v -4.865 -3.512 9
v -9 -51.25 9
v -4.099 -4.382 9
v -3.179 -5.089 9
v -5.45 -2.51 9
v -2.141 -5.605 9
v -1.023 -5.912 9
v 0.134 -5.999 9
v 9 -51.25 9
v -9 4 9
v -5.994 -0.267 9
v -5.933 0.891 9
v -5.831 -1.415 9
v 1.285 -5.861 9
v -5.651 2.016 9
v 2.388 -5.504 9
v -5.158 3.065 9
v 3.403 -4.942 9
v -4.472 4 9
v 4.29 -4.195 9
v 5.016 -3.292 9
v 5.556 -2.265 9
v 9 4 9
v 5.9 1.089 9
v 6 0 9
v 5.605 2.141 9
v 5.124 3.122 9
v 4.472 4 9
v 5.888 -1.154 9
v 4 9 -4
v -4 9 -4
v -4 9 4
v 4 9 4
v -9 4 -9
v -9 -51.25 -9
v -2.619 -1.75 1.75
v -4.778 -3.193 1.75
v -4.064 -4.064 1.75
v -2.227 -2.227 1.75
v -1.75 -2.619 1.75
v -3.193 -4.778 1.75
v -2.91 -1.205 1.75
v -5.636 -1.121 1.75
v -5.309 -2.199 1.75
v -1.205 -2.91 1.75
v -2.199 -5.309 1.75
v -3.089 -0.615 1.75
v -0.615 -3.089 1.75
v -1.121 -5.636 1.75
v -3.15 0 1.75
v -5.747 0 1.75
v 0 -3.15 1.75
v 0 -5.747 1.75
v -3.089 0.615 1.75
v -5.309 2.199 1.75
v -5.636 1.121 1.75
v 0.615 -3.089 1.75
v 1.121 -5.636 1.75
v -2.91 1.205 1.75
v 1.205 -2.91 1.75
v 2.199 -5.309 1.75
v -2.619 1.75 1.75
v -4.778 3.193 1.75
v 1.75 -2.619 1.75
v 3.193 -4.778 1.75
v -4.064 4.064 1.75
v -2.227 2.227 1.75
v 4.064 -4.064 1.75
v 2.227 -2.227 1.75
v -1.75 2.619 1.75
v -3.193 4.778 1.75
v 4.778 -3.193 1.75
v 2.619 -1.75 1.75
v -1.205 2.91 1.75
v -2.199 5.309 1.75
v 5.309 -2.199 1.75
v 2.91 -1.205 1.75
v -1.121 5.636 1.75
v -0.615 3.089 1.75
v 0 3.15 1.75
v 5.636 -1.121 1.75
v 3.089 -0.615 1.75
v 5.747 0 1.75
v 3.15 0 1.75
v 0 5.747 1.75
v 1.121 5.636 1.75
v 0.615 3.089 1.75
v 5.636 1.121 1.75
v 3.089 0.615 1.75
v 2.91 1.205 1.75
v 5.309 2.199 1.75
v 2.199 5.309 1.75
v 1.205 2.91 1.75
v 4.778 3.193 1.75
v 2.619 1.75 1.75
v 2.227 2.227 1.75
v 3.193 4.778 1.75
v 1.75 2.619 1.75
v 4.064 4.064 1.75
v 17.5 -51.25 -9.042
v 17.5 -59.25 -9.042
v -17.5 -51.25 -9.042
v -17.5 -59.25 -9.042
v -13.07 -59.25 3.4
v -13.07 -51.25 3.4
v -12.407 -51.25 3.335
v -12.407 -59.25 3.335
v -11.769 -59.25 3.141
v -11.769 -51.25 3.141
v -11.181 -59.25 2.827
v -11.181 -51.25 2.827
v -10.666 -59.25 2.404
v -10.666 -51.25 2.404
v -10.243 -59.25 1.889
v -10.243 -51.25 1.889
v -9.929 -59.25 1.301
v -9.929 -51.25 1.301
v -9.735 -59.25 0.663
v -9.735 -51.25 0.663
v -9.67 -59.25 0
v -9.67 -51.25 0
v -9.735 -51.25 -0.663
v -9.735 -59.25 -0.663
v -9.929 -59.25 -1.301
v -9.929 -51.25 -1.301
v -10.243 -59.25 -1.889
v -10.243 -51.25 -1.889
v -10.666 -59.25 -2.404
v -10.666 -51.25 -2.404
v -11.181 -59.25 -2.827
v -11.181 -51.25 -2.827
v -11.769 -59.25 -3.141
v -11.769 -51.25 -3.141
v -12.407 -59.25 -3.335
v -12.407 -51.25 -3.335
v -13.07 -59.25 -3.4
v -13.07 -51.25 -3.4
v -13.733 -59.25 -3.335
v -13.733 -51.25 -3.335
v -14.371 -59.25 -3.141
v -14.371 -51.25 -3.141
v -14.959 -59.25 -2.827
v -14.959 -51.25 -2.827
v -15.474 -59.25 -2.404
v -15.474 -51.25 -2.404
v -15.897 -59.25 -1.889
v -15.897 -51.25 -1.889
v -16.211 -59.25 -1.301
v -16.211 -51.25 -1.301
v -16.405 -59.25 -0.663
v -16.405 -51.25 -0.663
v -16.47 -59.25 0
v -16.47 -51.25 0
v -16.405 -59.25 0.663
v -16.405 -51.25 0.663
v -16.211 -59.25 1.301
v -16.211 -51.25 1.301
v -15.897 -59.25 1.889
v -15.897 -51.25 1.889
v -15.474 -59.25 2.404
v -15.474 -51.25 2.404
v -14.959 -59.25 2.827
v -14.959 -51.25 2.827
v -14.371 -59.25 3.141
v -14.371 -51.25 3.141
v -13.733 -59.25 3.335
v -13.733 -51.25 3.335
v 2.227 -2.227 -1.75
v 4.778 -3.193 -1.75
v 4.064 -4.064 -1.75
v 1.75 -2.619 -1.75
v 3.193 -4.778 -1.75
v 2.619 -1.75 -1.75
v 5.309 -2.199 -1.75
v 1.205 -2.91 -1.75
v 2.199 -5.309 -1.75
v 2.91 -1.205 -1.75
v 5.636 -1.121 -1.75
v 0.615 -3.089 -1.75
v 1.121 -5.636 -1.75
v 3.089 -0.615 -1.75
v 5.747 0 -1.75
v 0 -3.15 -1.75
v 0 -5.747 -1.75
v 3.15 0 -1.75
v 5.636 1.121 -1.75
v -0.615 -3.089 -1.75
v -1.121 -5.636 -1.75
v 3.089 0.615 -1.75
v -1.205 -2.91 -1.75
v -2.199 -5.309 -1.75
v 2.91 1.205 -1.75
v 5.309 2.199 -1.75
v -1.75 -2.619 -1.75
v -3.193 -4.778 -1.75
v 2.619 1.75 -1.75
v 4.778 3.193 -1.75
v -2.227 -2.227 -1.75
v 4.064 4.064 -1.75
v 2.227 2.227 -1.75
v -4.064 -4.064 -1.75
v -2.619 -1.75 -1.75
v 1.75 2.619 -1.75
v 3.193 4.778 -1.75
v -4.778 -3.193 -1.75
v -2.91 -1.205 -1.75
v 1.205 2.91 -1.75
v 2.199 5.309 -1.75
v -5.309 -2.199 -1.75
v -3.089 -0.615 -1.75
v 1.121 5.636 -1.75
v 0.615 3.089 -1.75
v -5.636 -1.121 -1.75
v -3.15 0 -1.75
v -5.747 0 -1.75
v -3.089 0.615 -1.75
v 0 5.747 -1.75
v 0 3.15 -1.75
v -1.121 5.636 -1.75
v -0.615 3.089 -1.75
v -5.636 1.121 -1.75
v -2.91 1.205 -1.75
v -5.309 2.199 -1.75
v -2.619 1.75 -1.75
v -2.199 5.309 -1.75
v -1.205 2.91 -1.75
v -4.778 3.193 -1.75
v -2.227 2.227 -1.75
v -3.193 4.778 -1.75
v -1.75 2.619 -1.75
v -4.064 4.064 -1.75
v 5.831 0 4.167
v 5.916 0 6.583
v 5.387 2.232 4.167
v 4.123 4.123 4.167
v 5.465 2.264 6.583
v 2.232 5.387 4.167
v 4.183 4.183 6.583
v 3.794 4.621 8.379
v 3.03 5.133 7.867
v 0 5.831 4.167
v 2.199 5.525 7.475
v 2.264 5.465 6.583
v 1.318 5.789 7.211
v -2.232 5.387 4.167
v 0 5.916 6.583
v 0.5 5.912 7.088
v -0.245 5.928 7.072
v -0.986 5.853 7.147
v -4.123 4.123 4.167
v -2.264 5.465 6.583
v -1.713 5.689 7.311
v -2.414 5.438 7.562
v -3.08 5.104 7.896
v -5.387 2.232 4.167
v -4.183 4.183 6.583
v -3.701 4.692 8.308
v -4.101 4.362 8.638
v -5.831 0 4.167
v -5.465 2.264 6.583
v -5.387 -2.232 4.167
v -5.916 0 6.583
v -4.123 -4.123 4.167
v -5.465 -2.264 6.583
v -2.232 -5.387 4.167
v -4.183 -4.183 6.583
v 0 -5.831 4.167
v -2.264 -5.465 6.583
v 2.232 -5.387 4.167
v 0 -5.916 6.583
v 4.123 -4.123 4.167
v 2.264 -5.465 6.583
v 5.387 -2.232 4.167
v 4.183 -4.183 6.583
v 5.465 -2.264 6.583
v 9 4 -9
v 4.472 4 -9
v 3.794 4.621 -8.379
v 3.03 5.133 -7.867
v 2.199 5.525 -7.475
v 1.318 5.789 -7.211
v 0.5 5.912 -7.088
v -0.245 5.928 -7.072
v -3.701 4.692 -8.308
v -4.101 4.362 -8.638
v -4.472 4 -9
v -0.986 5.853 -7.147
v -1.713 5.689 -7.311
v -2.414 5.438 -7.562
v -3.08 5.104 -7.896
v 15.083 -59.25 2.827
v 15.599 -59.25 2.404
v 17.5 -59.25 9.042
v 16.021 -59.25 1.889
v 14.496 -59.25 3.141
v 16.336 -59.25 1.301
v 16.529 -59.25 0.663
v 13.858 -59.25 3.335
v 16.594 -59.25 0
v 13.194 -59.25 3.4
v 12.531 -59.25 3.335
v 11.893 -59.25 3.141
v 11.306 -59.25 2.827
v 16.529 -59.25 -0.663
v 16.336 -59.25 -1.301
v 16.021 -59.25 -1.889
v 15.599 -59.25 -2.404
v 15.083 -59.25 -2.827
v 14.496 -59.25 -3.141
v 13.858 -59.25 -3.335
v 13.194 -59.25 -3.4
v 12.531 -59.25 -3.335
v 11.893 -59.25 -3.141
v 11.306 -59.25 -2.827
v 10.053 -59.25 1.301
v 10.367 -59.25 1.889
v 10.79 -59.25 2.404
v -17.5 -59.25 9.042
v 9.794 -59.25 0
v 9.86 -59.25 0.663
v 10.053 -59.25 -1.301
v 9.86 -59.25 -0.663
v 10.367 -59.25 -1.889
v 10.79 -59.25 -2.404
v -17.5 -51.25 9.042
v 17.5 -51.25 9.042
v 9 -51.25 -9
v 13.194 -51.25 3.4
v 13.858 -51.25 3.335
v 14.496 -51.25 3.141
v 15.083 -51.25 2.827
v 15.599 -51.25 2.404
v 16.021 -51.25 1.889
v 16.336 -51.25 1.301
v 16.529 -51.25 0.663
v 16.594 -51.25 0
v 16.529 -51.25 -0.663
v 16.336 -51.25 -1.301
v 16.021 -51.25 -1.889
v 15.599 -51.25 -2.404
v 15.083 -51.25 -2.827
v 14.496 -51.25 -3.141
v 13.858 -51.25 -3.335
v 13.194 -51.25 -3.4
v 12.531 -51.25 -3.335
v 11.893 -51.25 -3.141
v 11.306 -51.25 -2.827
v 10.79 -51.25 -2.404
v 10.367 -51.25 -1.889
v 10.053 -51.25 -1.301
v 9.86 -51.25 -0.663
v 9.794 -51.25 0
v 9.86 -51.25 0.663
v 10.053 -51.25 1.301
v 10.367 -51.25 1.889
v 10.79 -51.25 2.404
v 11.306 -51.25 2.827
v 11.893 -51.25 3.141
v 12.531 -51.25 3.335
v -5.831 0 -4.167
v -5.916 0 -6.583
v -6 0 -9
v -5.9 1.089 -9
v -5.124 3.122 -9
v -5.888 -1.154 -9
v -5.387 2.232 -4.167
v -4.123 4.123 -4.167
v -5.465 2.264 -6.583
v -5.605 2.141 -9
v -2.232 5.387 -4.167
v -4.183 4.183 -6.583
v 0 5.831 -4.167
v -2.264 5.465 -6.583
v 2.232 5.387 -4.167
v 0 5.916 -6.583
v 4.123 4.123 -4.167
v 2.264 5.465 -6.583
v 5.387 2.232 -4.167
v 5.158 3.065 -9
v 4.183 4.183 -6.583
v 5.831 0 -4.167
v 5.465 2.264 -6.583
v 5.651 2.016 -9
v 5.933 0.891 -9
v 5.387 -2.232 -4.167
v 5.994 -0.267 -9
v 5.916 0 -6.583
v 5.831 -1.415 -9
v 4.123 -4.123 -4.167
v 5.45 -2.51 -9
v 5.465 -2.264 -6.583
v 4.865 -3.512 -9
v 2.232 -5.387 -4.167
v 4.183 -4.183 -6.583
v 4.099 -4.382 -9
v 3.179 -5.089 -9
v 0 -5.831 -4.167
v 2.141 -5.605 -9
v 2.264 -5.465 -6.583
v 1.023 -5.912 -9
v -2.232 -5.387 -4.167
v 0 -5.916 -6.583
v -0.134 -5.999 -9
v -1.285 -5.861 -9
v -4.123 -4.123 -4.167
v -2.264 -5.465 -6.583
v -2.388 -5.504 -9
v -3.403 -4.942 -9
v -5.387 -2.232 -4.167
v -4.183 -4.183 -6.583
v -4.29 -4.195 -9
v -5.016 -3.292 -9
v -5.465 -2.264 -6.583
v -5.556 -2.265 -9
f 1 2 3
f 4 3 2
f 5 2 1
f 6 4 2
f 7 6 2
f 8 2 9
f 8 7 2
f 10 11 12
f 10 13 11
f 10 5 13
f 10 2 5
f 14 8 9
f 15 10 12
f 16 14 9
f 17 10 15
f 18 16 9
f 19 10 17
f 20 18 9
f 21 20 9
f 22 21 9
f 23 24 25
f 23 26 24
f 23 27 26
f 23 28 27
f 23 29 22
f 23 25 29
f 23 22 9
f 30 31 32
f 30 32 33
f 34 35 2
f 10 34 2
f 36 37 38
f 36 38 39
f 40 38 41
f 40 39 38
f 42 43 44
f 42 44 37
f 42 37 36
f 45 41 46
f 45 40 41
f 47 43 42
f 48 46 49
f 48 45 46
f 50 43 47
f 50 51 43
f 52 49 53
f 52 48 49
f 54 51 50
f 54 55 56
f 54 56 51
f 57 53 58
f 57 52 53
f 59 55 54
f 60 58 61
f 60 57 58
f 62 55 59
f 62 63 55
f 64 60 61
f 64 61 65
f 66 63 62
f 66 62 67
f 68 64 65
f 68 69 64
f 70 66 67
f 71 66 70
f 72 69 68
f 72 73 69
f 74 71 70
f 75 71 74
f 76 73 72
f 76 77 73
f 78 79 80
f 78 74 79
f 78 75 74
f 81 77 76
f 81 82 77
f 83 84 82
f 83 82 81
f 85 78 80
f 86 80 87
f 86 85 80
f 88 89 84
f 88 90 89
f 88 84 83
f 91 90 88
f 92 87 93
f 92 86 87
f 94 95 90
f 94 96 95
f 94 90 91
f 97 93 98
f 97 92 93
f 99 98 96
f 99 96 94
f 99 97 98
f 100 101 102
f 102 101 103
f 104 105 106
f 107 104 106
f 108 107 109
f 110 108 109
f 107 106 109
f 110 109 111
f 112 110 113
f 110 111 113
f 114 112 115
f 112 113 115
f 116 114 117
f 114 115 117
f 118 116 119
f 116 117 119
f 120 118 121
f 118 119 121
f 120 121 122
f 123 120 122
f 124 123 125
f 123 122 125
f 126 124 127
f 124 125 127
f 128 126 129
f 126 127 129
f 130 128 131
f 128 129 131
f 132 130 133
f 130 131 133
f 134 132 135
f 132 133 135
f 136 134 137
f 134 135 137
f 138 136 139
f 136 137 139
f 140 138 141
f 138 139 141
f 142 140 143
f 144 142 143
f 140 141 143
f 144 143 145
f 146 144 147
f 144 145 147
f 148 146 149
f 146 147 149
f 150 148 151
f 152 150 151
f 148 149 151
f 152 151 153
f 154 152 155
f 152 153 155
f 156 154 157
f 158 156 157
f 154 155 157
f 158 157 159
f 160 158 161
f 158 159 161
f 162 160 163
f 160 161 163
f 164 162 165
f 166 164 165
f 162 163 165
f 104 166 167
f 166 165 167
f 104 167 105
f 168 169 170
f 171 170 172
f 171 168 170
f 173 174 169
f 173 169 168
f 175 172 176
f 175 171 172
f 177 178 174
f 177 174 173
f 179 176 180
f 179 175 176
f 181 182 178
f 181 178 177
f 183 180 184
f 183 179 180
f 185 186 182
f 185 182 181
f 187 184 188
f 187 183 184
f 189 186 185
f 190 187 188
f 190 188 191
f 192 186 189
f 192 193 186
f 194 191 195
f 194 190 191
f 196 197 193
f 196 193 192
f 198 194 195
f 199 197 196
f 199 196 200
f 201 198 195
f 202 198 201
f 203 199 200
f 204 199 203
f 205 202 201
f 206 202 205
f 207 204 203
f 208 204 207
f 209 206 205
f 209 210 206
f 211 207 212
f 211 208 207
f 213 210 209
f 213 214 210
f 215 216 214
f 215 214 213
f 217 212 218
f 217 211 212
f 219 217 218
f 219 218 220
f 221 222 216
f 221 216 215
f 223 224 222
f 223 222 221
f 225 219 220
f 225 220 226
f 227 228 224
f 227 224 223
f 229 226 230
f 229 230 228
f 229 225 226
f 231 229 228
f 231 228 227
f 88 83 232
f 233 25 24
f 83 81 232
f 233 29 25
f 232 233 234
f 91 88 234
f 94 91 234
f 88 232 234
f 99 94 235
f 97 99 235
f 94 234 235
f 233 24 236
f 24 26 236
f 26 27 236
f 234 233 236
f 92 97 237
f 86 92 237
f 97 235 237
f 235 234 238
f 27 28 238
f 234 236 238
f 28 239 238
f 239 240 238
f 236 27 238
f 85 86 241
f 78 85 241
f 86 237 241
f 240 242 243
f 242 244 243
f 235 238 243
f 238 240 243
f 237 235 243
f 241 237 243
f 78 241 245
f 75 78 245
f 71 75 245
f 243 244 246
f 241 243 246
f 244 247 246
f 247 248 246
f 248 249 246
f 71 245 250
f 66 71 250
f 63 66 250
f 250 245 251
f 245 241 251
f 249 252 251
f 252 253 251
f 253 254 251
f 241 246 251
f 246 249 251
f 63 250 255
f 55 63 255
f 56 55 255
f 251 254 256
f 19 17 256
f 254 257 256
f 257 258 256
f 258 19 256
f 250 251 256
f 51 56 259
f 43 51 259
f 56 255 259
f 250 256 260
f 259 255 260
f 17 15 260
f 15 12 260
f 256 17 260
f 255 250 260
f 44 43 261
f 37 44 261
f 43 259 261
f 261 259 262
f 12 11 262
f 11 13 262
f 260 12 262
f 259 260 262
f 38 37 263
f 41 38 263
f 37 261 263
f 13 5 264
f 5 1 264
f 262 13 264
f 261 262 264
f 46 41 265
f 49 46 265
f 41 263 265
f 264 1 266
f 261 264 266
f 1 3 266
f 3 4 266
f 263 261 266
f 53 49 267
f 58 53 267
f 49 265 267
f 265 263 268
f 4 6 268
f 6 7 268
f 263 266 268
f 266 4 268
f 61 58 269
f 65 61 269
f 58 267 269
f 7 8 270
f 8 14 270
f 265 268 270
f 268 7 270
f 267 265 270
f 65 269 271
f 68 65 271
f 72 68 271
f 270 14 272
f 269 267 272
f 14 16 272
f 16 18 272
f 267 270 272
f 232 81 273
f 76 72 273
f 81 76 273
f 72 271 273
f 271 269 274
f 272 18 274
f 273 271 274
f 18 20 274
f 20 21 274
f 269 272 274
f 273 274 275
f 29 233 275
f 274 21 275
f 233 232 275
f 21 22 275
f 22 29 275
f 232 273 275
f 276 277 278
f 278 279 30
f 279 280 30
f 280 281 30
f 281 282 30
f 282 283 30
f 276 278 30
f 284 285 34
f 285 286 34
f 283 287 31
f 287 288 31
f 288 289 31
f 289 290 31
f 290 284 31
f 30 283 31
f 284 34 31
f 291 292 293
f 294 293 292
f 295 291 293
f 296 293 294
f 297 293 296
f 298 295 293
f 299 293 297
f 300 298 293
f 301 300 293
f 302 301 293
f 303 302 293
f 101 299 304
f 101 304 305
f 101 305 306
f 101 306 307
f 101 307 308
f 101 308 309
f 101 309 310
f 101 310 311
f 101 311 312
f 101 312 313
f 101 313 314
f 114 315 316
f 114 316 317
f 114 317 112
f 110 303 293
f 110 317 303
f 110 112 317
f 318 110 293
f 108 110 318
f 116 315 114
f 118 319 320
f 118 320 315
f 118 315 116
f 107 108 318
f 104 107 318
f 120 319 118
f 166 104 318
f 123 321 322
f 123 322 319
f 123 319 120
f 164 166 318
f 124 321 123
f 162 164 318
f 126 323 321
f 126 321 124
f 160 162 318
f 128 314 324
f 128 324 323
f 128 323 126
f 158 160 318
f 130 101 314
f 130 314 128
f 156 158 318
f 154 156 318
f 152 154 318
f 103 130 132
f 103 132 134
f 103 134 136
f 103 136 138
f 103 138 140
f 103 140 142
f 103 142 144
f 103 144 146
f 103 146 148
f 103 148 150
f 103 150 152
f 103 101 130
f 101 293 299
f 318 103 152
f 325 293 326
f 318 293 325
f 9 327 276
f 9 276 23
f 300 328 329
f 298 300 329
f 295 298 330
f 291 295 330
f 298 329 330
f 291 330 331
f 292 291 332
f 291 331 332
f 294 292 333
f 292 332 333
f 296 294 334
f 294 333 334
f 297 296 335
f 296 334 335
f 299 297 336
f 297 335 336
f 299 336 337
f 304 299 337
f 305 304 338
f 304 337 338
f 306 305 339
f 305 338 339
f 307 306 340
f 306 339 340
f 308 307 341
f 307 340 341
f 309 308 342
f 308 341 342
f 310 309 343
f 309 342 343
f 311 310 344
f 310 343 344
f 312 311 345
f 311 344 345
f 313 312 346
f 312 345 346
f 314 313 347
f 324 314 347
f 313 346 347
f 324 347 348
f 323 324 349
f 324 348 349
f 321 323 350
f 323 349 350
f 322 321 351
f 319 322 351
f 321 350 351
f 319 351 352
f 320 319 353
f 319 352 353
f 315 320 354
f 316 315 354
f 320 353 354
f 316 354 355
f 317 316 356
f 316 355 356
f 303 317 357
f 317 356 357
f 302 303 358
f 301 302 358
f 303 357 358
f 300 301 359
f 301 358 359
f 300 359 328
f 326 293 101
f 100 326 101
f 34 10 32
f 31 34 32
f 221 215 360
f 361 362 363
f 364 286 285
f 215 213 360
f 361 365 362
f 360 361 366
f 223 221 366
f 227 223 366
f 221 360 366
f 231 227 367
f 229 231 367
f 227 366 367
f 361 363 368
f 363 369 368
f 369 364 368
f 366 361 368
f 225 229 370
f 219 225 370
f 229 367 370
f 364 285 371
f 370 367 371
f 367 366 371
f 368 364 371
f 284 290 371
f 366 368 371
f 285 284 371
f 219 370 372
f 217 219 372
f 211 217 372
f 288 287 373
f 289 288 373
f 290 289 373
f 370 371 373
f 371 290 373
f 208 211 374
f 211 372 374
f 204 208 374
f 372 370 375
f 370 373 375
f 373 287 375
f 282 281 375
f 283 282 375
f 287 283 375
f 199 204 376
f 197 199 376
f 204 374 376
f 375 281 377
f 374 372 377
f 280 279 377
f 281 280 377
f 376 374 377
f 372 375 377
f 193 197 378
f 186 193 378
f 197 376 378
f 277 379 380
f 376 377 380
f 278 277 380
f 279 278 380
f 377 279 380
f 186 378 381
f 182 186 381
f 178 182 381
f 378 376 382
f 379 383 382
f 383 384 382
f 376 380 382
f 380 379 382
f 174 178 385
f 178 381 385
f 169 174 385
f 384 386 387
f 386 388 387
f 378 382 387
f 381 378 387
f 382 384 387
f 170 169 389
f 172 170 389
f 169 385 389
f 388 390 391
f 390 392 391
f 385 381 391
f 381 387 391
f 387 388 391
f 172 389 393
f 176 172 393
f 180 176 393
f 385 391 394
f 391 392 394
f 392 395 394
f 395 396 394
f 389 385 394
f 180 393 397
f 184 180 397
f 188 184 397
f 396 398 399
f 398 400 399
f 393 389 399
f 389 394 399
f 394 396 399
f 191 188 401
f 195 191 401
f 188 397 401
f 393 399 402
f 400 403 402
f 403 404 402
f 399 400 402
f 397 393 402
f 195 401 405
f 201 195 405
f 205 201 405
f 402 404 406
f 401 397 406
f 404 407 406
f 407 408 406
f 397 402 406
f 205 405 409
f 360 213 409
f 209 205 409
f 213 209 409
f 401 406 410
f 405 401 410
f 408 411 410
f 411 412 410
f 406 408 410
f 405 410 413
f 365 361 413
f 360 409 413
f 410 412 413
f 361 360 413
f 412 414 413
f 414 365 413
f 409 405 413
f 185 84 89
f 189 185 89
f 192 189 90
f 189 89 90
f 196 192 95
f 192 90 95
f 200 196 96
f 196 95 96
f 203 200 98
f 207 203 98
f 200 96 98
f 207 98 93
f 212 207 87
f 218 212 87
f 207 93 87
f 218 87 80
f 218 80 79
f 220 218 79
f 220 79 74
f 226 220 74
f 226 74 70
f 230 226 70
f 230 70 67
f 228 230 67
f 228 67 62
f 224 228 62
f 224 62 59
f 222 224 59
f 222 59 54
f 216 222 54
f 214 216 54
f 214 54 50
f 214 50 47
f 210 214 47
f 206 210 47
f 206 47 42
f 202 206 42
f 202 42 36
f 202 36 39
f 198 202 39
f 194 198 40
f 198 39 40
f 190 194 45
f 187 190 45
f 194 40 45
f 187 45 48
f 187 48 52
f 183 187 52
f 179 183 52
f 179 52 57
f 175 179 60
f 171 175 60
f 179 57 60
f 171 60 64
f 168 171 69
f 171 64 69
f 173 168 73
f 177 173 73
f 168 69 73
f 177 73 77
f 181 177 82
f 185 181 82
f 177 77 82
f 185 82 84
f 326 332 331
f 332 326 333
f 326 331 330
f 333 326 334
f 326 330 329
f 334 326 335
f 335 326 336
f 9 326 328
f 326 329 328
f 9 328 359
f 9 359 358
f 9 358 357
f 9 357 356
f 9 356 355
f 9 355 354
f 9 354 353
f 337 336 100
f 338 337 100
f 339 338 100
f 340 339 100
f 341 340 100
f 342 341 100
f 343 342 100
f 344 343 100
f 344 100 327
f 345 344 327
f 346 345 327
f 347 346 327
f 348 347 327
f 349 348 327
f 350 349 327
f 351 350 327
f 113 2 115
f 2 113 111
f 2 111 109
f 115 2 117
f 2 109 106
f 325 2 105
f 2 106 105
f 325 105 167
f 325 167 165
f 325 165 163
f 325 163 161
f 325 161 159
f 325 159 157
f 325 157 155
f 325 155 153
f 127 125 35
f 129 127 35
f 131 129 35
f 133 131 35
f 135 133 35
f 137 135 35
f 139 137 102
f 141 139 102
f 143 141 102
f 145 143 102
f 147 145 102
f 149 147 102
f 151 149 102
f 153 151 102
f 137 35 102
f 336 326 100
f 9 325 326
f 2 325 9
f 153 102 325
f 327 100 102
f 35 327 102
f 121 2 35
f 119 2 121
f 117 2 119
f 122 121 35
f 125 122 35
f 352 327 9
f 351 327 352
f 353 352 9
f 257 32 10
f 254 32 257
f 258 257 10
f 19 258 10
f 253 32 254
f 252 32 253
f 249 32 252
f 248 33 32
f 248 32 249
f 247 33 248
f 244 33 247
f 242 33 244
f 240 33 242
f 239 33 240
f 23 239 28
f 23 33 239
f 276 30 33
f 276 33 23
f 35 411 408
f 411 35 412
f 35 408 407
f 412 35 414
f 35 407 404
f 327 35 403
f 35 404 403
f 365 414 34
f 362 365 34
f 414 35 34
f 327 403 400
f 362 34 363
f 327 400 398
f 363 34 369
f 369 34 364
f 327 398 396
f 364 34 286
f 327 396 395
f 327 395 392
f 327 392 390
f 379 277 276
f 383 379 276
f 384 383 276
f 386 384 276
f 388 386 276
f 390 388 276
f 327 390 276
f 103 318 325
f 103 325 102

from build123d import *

# Parameters (mm, degrees)
SKETCH4_W           = 18
SKETCH4_H           = 18
BOSS_EXTRUDE2_DEPTH = 9
SKETCH5_R           = 3.15
CUT_EXTRUDE1_DEPTH  = 18
SKETCH6_R           = 6
CUT_EXTRUDE2_DEPTH  = 7.25
CUT_EXTRUDE2_DRAFT  = -2
SKETCH8_R           = 6
CUT_EXTRUDE3_DEPTH  = 7.25
CUT_EXTRUDE3_DRAFT  = -2
CHAMFER1_SIZE       = 5
SKETCH13_W          = 18
SKETCH13_H          = 18
BOSS_EXTRUDE4_DEPTH = 50.25
SKETCH14_W          = 35
SKETCH14_H          = 18.08381725
BOSS_EXTRUDE5_DEPTH = 8
SKETCH15_R          = 3.4
CUT_EXTRUDE4_DEPTH  = 8
SKETCH16_R          = 3.4
CUT_EXTRUDE5_DEPTH  = 8


with BuildPart() as part:
    # Sketch4 → Boss-Extrude2 (new, symmetric)
    with BuildSketch(Plane(origin=(0, 0, 0), x_dir=(1, 0, 0), z_dir=(0, 1, 0))):
        Rectangle(SKETCH4_W, SKETCH4_H)
    extrude(amount=BOSS_EXTRUDE2_DEPTH, both=True)

    # Sketch5 → Cut-Extrude1 (cut)
    with BuildSketch(Plane.XY.offset(9)):
        Circle(SKETCH5_R)
    extrude(amount=-CUT_EXTRUDE1_DEPTH, mode=Mode.SUBTRACT)


with BuildPart() as cut_extrude2_tool:
    # Sketch6 → Cut-Extrude2 (with draft: the straight prism first)
    with BuildSketch(Plane.XY.offset(9)):
        Circle(SKETCH6_R)
    extrude(amount=-CUT_EXTRUDE2_DEPTH)
    # Cut-Extrude2: the draft: its side faces are tilted about the plane it starts from
    cut_extrude2_sides = [cut_extrude2_tool.faces().sort_by_distance(p)[0] for p in [
        (-6, 0, 5.375),
    ]]
    draft(cut_extrude2_sides, Plane.XY.offset(9), CUT_EXTRUDE2_DRAFT)


with BuildPart() as part_1:
    add(part.part)

    # Cut-Extrude2: cut by cut_extrude2_tool
    add(cut_extrude2_tool.part, mode=Mode.SUBTRACT)


with BuildPart() as cut_extrude3_tool:
    # Sketch8 → Cut-Extrude3 (with draft: the straight prism first)
    with BuildSketch(Plane(origin=(0, 0, -9), x_dir=(-1, 0, 0), z_dir=(0, 0, -1))):
        Circle(SKETCH8_R)
    extrude(amount=-CUT_EXTRUDE3_DEPTH)
    # Cut-Extrude3: the draft: its side faces are tilted about the plane it starts from
    cut_extrude3_sides = [cut_extrude3_tool.faces().sort_by_distance(p)[0] for p in [
        (6, 0, -5.375),
    ]]
    draft(cut_extrude3_sides, Plane(origin=(0, 0, -9), x_dir=(-1, 0, 0), z_dir=(0, 0, -1)), CUT_EXTRUDE3_DRAFT)


with BuildPart() as part_2:
    add(part_1.part)

    # Cut-Extrude3: cut by cut_extrude3_tool
    add(cut_extrude3_tool.part, mode=Mode.SUBTRACT)

    # Chamfer1
    # the kernel refuses this chamfer: 5 mm, written as the material it takes off along each edge
    with BuildSketch(Plane(origin=(-9, 9, 21.85841494), x_dir=(-0.027495876610586317, -0.9996219169112968, 0), z_dir=(0, 0, -1)), Plane(origin=(-21.85841494, 9, -9), x_dir=(0, -0.9996219169112968, -0.027495876610586317), z_dir=(1, 0, 0))) as chamfer1_piece_1:
        Polygon((CHAMFER1_SIZE * 0.999621916911, -CHAMFER1_SIZE * 0.0274958766106), (-CHAMFER1_SIZE * 0.0274958766106, -CHAMFER1_SIZE * 0.999621916911), (0, 0), align=None)
    extrude(amount=43.71682988, mode=Mode.SUBTRACT)
    with BuildSketch(Plane(origin=(21.85841494, 9, 9), x_dir=(0, 0.027495876610586317, -0.9996219169112968), z_dir=(-1, 0, 0)), Plane(origin=(9, 9, -21.85841494), x_dir=(-0.9996219169112968, 0.027495876610586317, 0), z_dir=(0, 0, 1))) as chamfer1_piece_2:
        Polygon((CHAMFER1_SIZE * 0.999621916911, CHAMFER1_SIZE * 0.0274958766106), (-CHAMFER1_SIZE * 0.0274958766106, CHAMFER1_SIZE * 0.999621916911), (0, 0), align=None)
    extrude(amount=43.71682988, mode=Mode.SUBTRACT)

    # Sketch13 → Boss-Extrude4 (add)
    with BuildSketch(Plane.XZ.offset(9)):
        Rectangle(SKETCH13_W, SKETCH13_H)
    extrude(amount=BOSS_EXTRUDE4_DEPTH)

    # Sketch14 → Boss-Extrude5 (add)
    with BuildSketch(Plane(origin=(0, -59.25, 0), x_dir=(-1, 0, 0), z_dir=(0, -1, 0))):
        Rectangle(SKETCH14_W, SKETCH14_H)
    extrude(amount=-BOSS_EXTRUDE5_DEPTH)

    # Sketch15 → Cut-Extrude4 (cut)
    with BuildSketch(Plane(origin=(0, -51.25, 0), x_dir=(1, 0, 0), z_dir=(0, 1, 0))):
        with Locations(Location((-13.069976583, 0, 0), (0, 0, 270))):
            Circle(SKETCH15_R)
    extrude(amount=-CUT_EXTRUDE4_DEPTH, mode=Mode.SUBTRACT)

    # Sketch16 → Cut-Extrude5 (cut)
    with BuildSketch(Plane(origin=(0, -51.25, 0), x_dir=(1, 0, 0), z_dir=(0, 1, 0))):
        with Locations(Location((13.194452551, 0, 0), (0, 0, 270))):
            Circle(SKETCH16_R)
    extrude(amount=-CUT_EXTRUDE5_DEPTH, mode=Mode.SUBTRACT)


solid = part_2.part
